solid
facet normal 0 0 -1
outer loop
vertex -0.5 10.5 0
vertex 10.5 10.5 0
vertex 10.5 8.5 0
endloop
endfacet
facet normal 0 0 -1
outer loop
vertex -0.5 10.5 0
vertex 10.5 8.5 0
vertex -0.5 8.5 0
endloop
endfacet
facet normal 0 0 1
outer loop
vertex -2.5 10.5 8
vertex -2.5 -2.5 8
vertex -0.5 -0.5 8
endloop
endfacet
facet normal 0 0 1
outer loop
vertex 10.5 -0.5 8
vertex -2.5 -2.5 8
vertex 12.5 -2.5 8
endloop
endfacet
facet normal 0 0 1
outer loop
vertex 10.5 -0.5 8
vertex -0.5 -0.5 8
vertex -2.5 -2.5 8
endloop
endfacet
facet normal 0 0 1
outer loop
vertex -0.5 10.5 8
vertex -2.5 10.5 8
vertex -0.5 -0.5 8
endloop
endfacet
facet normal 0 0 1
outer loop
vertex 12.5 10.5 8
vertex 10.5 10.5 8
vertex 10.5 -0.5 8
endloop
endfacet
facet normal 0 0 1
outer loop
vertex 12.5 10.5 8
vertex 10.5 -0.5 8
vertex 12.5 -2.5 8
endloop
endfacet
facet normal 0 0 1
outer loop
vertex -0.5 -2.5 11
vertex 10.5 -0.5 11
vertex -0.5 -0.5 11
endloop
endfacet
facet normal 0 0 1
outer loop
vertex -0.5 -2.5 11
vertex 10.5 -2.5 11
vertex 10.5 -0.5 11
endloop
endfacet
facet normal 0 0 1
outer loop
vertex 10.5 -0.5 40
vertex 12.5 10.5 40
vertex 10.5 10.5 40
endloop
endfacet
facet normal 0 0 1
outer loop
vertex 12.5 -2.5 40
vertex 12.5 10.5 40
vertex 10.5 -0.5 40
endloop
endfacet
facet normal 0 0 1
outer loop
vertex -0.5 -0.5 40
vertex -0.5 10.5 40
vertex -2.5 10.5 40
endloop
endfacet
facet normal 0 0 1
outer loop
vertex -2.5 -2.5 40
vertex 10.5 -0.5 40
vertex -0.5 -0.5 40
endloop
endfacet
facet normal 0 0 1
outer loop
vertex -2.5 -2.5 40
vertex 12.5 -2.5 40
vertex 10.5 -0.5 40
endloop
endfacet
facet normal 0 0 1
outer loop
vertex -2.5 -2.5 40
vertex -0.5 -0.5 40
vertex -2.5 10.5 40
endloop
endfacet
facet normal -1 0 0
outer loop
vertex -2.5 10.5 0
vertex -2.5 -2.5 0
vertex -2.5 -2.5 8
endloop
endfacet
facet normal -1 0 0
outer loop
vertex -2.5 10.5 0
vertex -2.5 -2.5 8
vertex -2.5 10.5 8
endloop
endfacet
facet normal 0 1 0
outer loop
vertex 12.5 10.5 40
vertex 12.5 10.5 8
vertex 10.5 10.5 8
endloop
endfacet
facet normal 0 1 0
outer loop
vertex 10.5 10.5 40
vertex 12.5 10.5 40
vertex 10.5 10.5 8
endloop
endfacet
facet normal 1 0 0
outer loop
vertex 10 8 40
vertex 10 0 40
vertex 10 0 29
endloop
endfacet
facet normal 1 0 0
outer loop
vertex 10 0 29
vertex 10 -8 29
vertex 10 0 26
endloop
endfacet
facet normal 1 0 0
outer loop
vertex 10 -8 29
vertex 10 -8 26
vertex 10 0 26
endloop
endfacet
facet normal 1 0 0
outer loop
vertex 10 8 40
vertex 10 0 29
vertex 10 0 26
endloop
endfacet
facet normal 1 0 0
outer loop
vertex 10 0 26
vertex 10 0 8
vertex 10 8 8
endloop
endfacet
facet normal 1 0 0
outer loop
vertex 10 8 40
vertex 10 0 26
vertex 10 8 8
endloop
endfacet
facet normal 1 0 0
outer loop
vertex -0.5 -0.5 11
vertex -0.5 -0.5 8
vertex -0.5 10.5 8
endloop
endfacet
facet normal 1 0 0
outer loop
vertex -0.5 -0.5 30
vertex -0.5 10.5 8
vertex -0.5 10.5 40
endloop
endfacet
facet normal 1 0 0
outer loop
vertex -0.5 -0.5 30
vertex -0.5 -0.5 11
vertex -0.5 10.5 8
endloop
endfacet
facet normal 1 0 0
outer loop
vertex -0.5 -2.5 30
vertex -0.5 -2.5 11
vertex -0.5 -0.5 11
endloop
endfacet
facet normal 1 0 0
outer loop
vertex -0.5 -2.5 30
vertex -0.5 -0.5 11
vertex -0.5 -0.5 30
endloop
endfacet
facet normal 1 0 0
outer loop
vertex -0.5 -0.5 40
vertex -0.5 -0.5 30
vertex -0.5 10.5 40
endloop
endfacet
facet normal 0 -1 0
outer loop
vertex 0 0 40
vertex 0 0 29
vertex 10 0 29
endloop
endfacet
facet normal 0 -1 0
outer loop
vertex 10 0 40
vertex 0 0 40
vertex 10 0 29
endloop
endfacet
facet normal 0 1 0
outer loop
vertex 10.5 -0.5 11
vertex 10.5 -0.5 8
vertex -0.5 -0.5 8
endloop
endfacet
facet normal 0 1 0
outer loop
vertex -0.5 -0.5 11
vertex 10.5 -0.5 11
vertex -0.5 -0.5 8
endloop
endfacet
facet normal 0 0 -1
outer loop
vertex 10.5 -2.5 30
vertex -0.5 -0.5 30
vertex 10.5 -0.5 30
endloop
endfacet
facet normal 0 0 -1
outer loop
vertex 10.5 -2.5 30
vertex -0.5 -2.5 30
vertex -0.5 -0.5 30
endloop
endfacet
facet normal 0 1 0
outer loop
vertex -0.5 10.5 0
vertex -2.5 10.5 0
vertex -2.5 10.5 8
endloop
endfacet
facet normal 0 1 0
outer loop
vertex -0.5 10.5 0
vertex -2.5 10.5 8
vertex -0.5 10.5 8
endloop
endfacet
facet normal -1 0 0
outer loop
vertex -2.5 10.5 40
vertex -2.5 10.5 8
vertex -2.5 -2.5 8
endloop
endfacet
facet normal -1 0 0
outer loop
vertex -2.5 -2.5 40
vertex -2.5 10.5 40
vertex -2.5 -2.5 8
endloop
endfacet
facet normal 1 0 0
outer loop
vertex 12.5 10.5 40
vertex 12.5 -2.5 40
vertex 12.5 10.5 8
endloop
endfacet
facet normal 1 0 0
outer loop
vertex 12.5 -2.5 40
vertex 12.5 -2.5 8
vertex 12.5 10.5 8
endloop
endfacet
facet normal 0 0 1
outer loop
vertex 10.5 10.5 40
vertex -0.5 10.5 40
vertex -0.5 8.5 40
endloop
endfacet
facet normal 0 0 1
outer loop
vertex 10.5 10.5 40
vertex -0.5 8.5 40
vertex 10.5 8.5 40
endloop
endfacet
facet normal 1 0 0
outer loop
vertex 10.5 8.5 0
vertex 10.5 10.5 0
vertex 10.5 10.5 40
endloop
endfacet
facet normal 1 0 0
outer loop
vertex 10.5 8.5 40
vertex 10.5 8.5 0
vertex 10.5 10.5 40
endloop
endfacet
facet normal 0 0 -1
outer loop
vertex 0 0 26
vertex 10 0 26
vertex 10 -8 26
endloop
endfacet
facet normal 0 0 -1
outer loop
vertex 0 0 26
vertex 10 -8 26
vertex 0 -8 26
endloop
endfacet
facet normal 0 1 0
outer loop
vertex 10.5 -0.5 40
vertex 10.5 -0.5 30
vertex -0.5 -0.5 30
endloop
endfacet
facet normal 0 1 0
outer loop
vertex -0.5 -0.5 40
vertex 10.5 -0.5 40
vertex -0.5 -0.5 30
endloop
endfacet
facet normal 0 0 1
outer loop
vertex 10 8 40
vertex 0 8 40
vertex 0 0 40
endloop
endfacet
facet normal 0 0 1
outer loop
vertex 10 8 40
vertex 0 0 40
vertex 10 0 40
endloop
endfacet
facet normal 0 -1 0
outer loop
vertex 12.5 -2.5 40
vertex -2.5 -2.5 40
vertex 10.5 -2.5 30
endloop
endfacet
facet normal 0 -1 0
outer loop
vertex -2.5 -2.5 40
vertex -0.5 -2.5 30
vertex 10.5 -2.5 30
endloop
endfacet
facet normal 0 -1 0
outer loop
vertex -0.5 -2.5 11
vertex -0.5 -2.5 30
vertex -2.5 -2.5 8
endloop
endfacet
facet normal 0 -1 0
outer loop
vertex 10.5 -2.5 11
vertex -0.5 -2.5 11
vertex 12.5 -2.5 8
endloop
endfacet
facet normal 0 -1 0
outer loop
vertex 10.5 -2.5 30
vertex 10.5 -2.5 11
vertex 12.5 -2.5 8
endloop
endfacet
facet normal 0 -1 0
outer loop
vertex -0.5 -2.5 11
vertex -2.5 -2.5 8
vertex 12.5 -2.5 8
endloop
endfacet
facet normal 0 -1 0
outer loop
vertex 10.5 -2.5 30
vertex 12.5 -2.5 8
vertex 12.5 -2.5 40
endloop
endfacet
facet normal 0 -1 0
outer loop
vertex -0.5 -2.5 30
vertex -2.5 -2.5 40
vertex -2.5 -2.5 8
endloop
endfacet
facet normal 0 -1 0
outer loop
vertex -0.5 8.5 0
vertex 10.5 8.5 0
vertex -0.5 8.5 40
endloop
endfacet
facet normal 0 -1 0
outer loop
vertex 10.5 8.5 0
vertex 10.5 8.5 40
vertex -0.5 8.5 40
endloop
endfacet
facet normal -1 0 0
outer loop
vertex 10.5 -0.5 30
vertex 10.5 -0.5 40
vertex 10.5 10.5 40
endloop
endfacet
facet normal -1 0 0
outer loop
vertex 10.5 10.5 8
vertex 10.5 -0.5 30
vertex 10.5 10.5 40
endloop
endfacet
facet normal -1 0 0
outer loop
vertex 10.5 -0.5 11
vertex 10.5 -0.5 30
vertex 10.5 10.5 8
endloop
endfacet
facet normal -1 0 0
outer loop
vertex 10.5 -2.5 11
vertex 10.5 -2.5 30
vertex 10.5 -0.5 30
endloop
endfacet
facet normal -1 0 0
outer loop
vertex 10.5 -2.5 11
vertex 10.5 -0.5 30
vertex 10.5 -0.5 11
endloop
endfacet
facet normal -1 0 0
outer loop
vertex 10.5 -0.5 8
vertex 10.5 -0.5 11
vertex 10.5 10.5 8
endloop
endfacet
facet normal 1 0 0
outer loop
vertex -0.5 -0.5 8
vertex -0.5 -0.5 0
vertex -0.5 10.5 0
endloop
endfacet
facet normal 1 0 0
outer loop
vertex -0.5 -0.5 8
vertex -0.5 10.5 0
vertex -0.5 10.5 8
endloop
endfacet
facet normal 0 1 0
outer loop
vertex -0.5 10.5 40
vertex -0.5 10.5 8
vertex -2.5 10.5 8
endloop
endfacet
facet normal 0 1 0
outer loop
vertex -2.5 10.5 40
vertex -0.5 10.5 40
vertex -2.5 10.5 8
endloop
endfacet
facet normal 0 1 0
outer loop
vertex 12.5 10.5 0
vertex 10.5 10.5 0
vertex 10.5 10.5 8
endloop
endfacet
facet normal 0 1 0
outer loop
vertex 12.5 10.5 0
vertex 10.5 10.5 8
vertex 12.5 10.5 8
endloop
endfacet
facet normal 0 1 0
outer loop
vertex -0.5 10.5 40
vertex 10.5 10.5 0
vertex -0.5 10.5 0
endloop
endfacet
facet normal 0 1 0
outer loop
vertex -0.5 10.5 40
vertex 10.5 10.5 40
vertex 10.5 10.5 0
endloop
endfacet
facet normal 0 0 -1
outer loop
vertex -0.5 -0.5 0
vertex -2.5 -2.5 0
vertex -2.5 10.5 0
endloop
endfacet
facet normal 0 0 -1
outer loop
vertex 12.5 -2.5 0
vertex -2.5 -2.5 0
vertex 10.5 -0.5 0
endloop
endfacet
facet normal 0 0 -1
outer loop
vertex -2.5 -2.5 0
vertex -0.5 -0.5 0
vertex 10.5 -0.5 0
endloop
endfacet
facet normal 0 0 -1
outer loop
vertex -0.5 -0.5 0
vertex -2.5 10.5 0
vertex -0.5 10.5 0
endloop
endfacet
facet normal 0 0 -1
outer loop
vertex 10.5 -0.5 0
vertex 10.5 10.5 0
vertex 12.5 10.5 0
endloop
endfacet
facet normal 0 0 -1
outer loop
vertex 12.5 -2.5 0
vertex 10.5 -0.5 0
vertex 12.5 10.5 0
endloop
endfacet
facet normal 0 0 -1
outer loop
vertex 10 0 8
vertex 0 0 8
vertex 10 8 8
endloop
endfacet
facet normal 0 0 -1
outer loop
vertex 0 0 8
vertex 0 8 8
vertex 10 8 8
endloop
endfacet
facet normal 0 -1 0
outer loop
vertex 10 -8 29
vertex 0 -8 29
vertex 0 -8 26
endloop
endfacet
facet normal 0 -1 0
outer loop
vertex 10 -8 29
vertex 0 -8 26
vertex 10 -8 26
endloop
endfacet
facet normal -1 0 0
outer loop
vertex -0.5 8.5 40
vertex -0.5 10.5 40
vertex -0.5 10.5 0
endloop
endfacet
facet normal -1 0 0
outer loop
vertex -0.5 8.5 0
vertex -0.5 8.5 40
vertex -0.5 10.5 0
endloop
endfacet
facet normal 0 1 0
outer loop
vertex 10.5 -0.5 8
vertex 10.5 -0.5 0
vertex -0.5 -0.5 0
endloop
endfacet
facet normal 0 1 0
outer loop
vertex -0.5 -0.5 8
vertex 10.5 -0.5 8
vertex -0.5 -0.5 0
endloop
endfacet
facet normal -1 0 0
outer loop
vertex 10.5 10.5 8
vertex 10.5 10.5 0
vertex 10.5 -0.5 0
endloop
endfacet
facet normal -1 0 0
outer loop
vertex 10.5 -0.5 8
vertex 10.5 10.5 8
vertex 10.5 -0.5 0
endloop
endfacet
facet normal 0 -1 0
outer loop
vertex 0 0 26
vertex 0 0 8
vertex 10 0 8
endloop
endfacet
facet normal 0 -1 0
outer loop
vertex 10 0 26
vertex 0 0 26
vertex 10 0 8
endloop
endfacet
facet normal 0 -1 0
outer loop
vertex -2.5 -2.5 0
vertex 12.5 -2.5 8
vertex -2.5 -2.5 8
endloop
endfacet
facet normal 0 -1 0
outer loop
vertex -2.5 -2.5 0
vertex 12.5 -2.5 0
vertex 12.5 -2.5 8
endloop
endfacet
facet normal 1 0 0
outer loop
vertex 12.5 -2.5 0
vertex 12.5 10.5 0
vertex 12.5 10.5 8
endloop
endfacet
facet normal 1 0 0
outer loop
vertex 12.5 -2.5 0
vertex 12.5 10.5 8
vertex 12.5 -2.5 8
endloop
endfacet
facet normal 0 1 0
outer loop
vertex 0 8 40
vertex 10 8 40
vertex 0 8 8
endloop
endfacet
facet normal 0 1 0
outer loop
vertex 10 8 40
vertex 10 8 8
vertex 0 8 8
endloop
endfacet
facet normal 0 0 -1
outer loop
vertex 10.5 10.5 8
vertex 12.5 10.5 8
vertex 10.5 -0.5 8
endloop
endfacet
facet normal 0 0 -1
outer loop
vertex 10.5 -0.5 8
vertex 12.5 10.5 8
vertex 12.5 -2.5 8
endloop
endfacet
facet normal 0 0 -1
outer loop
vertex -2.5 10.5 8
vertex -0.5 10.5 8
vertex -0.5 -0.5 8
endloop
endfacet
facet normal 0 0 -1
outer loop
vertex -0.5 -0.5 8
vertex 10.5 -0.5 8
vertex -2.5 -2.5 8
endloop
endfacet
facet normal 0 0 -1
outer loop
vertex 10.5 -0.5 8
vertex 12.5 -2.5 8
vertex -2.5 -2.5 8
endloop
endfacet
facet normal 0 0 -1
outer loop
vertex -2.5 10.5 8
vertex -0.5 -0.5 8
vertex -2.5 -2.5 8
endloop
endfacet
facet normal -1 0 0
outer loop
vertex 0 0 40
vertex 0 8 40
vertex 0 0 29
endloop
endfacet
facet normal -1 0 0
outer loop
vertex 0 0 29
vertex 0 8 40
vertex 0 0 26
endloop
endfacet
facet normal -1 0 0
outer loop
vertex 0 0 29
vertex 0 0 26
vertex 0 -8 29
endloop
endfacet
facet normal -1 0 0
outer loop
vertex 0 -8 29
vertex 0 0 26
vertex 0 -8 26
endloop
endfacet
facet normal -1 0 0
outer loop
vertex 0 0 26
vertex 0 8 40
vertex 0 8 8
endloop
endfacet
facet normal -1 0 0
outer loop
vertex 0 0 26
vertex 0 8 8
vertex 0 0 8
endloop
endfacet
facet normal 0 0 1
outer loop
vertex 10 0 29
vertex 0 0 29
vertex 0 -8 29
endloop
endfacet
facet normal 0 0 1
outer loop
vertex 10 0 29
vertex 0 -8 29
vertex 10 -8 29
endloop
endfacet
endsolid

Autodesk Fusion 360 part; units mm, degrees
sketch "Sketch1" plane through (0, 0, 0) normal (0, 0, 1) x (1, 0, 0)
  line L0 (0, 0) -> (10, 0)
  line L1 (10, 0) -> (10, 8)
  line L2 (10, 8) -> (0, 8)
  line L3 (0, 8) -> (0, 0)
  line L4 (-0.5, 8.5) -> (10.5, 8.5)
  line L5 (10.5, 8.5) -> (10.5, -0.5)
  line L6 (10.5, -0.5) -> (-0.5, -0.5)
  line L7 (-0.5, -0.5) -> (-0.5, 8.5)
  line L8 (-2.5, 10.5) -> (12.5, 10.5)
  line L9 (12.5, 10.5) -> (12.5, -2.5)
  line L10 (12.5, -2.5) -> (-2.5, -2.5)
  line L11 (-2.5, -2.5) -> (-2.5, 10.5)
  dimension "d4" = 10
  dimension "d5" = 8
  dimension "d6" = 0.5
  dimension "d7" = 0.5
  dimension "d8" = 0.5
  dimension "d9" = 0.5
  dimension "d11" = 2
  dimension "d12" = 2
  dimension "d13" = 2
  dimension "d14" = 2
extrude "Extrude1" add sketch "Sketch1" along normal blind 8 contours L8 L9 L10 L11 makes body 1
extrude "Extrude2" add sketch "Sketch1" along normal blind 40 separate body contours L0 L1 L2 L3 makes body 2
sketch "Sketch2" plane through (0, 0, 8) normal (0, 0, 1) x (-1, 0, 0)
  line L0 (-10.5, 0.5) -> (0.5, 0.5)
  line L1 (0.5, 0.5) -> (0.5, -8.5)
  line L2 (0.5, -8.5) -> (-10.5, -8.5)
  line L3 (-10.5, -8.5) -> (-10.5, 0.5)
  line L4 (2.5, 2.5) -> (-12.5, 2.5)
  line L5 (-12.5, 2.5) -> (-12.5, -10.5)
  line L6 (-12.5, -10.5) -> (2.5, -10.5)
  line L7 (2.5, -10.5) -> (2.5, 2.5)
extrude "Extrude3" add sketch "Sketch2" along normal up to surface (32 mm away) separate body makes body 3
sketch "Sketch3" plane through (0, -2.5, 0) normal (0, -1, 0) x (1, 0, 0)
  line L0 (-2.5, 8) -> (12.5, 8)
  line L1 (12.5, 8) -> (12.5, 40)
  line L2 (12.5, 40) -> (-2.5, 40)
  line L3 (-2.5, 40) -> (-2.5, 8)
  line L4 (10.5, 8) -> (-0.5, 8)
  line L5 (-0.5, 8) -> (-0.5, 40)
  line L6 (-0.5, 40) -> (10.5, 40)
  line L7 (10.5, 40) -> (10.5, 8)
  line L8 (-0.5, 30) -> (10.5, 30)
  line L9 (10.5, 30) -> (10.5, 11)
  line L10 (10.5, 11) -> (-0.5, 11)
  line L11 (-0.5, 11) -> (-0.5, 30)
  dimension "d21" = 10
  dimension "d22" = 3
extrude "Extrude4" cut sketch "Sketch3" against normal up to surface (2 mm away) contours L5 L7 L8 L9 L10 L11 bodies 3
sketch "Sketch4" plane through (0, 0, 0) normal (0, -1, 0) x (1, 0, 0)
  line L0 (0, 0) -> (10, 0)
  line L1 (10, 0) -> (10, 40)
  line L2 (10, 40) -> (0, 40)
  line L3 (0, 40) -> (0, 0)
  line L4 (-0.5, 11) -> (-0.5, 30)
  line L5 (-0.5, 30) -> (10.5, 30)
  line L6 (10.5, 30) -> (10.5, 11)
  line L7 (10.5, 11) -> (-0.5, 11)
  line L8 (12.5, 40) -> (-2.5, 40)
  line L9 (-2.5, 40) -> (-2.5, 8)
  line L10 (-2.5, 8) -> (12.5, 8)
  line L11 (12.5, 8) -> (12.5, 40)
  line L12 (0, 29) -> (10, 29)
  line L13 (10, 29) -> (10, 26)
  line L14 (10, 26) -> (0, 26)
  line L15 (0, 26) -> (0, 29)
  dimension "d26" = 3
  dimension "d27" = 1
extrude "Extrude5" add sketch "Sketch4" along normal blind 8 contours L1 L3 L12 L13 L14 L15 bodies 2
extrude "Extrude6" cut sketch "Sketch1" along normal up to surface (8 mm away) contours L0 L1 L2 L3 bodies 2
copy_body "Body->Comp1" bodies 2 removing the originals makes body 4 in component "Component"
copy_body "Body->Comp2" bodies 3 removing the originals makes body 5 in component "Component'"
extrude "Extrude1'" cut 1 faces at (3.1667, 8.5, 18.6667) along direction (0, 1, 0) blind 2 on bodies 5 bodies 5 in component "Component'"
extrude "Extrude7" cut 1 faces at (3.1667, 8.5, 2.6667) along direction (0, 1, 0) blind 2 on bodies 1 bodies 1
sketch "Sketch5" plane through (0, 10.5, 0) normal (0, 1, 0) x (-1, 0, 0)
  line L0 (-10.5, 8) -> (-10.5, 40)
  line L1 (-10.5, 40) -> (-12.5, 40)
  line L2 (-12.5, 40) -> (-12.5, 8)
  line L3 (-12.5, 8) -> (-10.5, 8)
  line L4 (-10.5, 0) -> (0.5, 0)
  line L5 (0.5, 0) -> (0.5, 8)
  line L6 (0.5, 8) -> (-10.5, 8)
  line L7 (-10.5, 8) -> (-10.5, 0)
  line L8 (-10.5, 30) -> (0.5, 30)
  line L9 (0.5, 30) -> (0.5, 40)
  line L10 (0.5, 40) -> (-10.5, 40)
  line L11 (-10.5, 40) -> (-10.5, 30)
  line L12 (-10.5, 40) -> (0.5, 40)
  line L13 (0.5, 40) -> (0.5, 0)
  line L14 (0.5, 0) -> (-10.5, 0)
  line L15 (-10.5, 0) -> (-10.5, 40)
extrude "Extrude8" add sketch "Sketch5" against normal blind 2 separate body contours L0 L6 L8 L13 L15 | L4 L5 L6 L7 L13 L14 L15 | L0 L8 L9 L10 L11 L12 L13 L15 makes body 6
component "Component" placed x (1, 0, 0) y (0, 1, 0) z (0, 0, 1) at (0, 0, 0)
component "Component'" placed x (1, 0, 0) y (0, 1, 0) z (0, 0, 1) at (0, 0, 0)
equation "Latch_width = 10 mm"
equation "Latch_height = 8 mm"
equation "Latch_gap = 0.5 mm"
equation "d4 = Latch_width"
equation "d5 = Latch_height"
equation "d6 = Latch_gap"
equation "d7 = Latch_gap"
equation "d8 = Latch_gap"
equation "d9 = Latch_gap"
equation "Latch_shell_thickness = 2 mm"
equation "d11 = Latch_shell_thickness"
equation "d12 = Latch_shell_thickness"
equation "d13 = Latch_shell_thickness"
equation "d14 = Latch_shell_thickness"
